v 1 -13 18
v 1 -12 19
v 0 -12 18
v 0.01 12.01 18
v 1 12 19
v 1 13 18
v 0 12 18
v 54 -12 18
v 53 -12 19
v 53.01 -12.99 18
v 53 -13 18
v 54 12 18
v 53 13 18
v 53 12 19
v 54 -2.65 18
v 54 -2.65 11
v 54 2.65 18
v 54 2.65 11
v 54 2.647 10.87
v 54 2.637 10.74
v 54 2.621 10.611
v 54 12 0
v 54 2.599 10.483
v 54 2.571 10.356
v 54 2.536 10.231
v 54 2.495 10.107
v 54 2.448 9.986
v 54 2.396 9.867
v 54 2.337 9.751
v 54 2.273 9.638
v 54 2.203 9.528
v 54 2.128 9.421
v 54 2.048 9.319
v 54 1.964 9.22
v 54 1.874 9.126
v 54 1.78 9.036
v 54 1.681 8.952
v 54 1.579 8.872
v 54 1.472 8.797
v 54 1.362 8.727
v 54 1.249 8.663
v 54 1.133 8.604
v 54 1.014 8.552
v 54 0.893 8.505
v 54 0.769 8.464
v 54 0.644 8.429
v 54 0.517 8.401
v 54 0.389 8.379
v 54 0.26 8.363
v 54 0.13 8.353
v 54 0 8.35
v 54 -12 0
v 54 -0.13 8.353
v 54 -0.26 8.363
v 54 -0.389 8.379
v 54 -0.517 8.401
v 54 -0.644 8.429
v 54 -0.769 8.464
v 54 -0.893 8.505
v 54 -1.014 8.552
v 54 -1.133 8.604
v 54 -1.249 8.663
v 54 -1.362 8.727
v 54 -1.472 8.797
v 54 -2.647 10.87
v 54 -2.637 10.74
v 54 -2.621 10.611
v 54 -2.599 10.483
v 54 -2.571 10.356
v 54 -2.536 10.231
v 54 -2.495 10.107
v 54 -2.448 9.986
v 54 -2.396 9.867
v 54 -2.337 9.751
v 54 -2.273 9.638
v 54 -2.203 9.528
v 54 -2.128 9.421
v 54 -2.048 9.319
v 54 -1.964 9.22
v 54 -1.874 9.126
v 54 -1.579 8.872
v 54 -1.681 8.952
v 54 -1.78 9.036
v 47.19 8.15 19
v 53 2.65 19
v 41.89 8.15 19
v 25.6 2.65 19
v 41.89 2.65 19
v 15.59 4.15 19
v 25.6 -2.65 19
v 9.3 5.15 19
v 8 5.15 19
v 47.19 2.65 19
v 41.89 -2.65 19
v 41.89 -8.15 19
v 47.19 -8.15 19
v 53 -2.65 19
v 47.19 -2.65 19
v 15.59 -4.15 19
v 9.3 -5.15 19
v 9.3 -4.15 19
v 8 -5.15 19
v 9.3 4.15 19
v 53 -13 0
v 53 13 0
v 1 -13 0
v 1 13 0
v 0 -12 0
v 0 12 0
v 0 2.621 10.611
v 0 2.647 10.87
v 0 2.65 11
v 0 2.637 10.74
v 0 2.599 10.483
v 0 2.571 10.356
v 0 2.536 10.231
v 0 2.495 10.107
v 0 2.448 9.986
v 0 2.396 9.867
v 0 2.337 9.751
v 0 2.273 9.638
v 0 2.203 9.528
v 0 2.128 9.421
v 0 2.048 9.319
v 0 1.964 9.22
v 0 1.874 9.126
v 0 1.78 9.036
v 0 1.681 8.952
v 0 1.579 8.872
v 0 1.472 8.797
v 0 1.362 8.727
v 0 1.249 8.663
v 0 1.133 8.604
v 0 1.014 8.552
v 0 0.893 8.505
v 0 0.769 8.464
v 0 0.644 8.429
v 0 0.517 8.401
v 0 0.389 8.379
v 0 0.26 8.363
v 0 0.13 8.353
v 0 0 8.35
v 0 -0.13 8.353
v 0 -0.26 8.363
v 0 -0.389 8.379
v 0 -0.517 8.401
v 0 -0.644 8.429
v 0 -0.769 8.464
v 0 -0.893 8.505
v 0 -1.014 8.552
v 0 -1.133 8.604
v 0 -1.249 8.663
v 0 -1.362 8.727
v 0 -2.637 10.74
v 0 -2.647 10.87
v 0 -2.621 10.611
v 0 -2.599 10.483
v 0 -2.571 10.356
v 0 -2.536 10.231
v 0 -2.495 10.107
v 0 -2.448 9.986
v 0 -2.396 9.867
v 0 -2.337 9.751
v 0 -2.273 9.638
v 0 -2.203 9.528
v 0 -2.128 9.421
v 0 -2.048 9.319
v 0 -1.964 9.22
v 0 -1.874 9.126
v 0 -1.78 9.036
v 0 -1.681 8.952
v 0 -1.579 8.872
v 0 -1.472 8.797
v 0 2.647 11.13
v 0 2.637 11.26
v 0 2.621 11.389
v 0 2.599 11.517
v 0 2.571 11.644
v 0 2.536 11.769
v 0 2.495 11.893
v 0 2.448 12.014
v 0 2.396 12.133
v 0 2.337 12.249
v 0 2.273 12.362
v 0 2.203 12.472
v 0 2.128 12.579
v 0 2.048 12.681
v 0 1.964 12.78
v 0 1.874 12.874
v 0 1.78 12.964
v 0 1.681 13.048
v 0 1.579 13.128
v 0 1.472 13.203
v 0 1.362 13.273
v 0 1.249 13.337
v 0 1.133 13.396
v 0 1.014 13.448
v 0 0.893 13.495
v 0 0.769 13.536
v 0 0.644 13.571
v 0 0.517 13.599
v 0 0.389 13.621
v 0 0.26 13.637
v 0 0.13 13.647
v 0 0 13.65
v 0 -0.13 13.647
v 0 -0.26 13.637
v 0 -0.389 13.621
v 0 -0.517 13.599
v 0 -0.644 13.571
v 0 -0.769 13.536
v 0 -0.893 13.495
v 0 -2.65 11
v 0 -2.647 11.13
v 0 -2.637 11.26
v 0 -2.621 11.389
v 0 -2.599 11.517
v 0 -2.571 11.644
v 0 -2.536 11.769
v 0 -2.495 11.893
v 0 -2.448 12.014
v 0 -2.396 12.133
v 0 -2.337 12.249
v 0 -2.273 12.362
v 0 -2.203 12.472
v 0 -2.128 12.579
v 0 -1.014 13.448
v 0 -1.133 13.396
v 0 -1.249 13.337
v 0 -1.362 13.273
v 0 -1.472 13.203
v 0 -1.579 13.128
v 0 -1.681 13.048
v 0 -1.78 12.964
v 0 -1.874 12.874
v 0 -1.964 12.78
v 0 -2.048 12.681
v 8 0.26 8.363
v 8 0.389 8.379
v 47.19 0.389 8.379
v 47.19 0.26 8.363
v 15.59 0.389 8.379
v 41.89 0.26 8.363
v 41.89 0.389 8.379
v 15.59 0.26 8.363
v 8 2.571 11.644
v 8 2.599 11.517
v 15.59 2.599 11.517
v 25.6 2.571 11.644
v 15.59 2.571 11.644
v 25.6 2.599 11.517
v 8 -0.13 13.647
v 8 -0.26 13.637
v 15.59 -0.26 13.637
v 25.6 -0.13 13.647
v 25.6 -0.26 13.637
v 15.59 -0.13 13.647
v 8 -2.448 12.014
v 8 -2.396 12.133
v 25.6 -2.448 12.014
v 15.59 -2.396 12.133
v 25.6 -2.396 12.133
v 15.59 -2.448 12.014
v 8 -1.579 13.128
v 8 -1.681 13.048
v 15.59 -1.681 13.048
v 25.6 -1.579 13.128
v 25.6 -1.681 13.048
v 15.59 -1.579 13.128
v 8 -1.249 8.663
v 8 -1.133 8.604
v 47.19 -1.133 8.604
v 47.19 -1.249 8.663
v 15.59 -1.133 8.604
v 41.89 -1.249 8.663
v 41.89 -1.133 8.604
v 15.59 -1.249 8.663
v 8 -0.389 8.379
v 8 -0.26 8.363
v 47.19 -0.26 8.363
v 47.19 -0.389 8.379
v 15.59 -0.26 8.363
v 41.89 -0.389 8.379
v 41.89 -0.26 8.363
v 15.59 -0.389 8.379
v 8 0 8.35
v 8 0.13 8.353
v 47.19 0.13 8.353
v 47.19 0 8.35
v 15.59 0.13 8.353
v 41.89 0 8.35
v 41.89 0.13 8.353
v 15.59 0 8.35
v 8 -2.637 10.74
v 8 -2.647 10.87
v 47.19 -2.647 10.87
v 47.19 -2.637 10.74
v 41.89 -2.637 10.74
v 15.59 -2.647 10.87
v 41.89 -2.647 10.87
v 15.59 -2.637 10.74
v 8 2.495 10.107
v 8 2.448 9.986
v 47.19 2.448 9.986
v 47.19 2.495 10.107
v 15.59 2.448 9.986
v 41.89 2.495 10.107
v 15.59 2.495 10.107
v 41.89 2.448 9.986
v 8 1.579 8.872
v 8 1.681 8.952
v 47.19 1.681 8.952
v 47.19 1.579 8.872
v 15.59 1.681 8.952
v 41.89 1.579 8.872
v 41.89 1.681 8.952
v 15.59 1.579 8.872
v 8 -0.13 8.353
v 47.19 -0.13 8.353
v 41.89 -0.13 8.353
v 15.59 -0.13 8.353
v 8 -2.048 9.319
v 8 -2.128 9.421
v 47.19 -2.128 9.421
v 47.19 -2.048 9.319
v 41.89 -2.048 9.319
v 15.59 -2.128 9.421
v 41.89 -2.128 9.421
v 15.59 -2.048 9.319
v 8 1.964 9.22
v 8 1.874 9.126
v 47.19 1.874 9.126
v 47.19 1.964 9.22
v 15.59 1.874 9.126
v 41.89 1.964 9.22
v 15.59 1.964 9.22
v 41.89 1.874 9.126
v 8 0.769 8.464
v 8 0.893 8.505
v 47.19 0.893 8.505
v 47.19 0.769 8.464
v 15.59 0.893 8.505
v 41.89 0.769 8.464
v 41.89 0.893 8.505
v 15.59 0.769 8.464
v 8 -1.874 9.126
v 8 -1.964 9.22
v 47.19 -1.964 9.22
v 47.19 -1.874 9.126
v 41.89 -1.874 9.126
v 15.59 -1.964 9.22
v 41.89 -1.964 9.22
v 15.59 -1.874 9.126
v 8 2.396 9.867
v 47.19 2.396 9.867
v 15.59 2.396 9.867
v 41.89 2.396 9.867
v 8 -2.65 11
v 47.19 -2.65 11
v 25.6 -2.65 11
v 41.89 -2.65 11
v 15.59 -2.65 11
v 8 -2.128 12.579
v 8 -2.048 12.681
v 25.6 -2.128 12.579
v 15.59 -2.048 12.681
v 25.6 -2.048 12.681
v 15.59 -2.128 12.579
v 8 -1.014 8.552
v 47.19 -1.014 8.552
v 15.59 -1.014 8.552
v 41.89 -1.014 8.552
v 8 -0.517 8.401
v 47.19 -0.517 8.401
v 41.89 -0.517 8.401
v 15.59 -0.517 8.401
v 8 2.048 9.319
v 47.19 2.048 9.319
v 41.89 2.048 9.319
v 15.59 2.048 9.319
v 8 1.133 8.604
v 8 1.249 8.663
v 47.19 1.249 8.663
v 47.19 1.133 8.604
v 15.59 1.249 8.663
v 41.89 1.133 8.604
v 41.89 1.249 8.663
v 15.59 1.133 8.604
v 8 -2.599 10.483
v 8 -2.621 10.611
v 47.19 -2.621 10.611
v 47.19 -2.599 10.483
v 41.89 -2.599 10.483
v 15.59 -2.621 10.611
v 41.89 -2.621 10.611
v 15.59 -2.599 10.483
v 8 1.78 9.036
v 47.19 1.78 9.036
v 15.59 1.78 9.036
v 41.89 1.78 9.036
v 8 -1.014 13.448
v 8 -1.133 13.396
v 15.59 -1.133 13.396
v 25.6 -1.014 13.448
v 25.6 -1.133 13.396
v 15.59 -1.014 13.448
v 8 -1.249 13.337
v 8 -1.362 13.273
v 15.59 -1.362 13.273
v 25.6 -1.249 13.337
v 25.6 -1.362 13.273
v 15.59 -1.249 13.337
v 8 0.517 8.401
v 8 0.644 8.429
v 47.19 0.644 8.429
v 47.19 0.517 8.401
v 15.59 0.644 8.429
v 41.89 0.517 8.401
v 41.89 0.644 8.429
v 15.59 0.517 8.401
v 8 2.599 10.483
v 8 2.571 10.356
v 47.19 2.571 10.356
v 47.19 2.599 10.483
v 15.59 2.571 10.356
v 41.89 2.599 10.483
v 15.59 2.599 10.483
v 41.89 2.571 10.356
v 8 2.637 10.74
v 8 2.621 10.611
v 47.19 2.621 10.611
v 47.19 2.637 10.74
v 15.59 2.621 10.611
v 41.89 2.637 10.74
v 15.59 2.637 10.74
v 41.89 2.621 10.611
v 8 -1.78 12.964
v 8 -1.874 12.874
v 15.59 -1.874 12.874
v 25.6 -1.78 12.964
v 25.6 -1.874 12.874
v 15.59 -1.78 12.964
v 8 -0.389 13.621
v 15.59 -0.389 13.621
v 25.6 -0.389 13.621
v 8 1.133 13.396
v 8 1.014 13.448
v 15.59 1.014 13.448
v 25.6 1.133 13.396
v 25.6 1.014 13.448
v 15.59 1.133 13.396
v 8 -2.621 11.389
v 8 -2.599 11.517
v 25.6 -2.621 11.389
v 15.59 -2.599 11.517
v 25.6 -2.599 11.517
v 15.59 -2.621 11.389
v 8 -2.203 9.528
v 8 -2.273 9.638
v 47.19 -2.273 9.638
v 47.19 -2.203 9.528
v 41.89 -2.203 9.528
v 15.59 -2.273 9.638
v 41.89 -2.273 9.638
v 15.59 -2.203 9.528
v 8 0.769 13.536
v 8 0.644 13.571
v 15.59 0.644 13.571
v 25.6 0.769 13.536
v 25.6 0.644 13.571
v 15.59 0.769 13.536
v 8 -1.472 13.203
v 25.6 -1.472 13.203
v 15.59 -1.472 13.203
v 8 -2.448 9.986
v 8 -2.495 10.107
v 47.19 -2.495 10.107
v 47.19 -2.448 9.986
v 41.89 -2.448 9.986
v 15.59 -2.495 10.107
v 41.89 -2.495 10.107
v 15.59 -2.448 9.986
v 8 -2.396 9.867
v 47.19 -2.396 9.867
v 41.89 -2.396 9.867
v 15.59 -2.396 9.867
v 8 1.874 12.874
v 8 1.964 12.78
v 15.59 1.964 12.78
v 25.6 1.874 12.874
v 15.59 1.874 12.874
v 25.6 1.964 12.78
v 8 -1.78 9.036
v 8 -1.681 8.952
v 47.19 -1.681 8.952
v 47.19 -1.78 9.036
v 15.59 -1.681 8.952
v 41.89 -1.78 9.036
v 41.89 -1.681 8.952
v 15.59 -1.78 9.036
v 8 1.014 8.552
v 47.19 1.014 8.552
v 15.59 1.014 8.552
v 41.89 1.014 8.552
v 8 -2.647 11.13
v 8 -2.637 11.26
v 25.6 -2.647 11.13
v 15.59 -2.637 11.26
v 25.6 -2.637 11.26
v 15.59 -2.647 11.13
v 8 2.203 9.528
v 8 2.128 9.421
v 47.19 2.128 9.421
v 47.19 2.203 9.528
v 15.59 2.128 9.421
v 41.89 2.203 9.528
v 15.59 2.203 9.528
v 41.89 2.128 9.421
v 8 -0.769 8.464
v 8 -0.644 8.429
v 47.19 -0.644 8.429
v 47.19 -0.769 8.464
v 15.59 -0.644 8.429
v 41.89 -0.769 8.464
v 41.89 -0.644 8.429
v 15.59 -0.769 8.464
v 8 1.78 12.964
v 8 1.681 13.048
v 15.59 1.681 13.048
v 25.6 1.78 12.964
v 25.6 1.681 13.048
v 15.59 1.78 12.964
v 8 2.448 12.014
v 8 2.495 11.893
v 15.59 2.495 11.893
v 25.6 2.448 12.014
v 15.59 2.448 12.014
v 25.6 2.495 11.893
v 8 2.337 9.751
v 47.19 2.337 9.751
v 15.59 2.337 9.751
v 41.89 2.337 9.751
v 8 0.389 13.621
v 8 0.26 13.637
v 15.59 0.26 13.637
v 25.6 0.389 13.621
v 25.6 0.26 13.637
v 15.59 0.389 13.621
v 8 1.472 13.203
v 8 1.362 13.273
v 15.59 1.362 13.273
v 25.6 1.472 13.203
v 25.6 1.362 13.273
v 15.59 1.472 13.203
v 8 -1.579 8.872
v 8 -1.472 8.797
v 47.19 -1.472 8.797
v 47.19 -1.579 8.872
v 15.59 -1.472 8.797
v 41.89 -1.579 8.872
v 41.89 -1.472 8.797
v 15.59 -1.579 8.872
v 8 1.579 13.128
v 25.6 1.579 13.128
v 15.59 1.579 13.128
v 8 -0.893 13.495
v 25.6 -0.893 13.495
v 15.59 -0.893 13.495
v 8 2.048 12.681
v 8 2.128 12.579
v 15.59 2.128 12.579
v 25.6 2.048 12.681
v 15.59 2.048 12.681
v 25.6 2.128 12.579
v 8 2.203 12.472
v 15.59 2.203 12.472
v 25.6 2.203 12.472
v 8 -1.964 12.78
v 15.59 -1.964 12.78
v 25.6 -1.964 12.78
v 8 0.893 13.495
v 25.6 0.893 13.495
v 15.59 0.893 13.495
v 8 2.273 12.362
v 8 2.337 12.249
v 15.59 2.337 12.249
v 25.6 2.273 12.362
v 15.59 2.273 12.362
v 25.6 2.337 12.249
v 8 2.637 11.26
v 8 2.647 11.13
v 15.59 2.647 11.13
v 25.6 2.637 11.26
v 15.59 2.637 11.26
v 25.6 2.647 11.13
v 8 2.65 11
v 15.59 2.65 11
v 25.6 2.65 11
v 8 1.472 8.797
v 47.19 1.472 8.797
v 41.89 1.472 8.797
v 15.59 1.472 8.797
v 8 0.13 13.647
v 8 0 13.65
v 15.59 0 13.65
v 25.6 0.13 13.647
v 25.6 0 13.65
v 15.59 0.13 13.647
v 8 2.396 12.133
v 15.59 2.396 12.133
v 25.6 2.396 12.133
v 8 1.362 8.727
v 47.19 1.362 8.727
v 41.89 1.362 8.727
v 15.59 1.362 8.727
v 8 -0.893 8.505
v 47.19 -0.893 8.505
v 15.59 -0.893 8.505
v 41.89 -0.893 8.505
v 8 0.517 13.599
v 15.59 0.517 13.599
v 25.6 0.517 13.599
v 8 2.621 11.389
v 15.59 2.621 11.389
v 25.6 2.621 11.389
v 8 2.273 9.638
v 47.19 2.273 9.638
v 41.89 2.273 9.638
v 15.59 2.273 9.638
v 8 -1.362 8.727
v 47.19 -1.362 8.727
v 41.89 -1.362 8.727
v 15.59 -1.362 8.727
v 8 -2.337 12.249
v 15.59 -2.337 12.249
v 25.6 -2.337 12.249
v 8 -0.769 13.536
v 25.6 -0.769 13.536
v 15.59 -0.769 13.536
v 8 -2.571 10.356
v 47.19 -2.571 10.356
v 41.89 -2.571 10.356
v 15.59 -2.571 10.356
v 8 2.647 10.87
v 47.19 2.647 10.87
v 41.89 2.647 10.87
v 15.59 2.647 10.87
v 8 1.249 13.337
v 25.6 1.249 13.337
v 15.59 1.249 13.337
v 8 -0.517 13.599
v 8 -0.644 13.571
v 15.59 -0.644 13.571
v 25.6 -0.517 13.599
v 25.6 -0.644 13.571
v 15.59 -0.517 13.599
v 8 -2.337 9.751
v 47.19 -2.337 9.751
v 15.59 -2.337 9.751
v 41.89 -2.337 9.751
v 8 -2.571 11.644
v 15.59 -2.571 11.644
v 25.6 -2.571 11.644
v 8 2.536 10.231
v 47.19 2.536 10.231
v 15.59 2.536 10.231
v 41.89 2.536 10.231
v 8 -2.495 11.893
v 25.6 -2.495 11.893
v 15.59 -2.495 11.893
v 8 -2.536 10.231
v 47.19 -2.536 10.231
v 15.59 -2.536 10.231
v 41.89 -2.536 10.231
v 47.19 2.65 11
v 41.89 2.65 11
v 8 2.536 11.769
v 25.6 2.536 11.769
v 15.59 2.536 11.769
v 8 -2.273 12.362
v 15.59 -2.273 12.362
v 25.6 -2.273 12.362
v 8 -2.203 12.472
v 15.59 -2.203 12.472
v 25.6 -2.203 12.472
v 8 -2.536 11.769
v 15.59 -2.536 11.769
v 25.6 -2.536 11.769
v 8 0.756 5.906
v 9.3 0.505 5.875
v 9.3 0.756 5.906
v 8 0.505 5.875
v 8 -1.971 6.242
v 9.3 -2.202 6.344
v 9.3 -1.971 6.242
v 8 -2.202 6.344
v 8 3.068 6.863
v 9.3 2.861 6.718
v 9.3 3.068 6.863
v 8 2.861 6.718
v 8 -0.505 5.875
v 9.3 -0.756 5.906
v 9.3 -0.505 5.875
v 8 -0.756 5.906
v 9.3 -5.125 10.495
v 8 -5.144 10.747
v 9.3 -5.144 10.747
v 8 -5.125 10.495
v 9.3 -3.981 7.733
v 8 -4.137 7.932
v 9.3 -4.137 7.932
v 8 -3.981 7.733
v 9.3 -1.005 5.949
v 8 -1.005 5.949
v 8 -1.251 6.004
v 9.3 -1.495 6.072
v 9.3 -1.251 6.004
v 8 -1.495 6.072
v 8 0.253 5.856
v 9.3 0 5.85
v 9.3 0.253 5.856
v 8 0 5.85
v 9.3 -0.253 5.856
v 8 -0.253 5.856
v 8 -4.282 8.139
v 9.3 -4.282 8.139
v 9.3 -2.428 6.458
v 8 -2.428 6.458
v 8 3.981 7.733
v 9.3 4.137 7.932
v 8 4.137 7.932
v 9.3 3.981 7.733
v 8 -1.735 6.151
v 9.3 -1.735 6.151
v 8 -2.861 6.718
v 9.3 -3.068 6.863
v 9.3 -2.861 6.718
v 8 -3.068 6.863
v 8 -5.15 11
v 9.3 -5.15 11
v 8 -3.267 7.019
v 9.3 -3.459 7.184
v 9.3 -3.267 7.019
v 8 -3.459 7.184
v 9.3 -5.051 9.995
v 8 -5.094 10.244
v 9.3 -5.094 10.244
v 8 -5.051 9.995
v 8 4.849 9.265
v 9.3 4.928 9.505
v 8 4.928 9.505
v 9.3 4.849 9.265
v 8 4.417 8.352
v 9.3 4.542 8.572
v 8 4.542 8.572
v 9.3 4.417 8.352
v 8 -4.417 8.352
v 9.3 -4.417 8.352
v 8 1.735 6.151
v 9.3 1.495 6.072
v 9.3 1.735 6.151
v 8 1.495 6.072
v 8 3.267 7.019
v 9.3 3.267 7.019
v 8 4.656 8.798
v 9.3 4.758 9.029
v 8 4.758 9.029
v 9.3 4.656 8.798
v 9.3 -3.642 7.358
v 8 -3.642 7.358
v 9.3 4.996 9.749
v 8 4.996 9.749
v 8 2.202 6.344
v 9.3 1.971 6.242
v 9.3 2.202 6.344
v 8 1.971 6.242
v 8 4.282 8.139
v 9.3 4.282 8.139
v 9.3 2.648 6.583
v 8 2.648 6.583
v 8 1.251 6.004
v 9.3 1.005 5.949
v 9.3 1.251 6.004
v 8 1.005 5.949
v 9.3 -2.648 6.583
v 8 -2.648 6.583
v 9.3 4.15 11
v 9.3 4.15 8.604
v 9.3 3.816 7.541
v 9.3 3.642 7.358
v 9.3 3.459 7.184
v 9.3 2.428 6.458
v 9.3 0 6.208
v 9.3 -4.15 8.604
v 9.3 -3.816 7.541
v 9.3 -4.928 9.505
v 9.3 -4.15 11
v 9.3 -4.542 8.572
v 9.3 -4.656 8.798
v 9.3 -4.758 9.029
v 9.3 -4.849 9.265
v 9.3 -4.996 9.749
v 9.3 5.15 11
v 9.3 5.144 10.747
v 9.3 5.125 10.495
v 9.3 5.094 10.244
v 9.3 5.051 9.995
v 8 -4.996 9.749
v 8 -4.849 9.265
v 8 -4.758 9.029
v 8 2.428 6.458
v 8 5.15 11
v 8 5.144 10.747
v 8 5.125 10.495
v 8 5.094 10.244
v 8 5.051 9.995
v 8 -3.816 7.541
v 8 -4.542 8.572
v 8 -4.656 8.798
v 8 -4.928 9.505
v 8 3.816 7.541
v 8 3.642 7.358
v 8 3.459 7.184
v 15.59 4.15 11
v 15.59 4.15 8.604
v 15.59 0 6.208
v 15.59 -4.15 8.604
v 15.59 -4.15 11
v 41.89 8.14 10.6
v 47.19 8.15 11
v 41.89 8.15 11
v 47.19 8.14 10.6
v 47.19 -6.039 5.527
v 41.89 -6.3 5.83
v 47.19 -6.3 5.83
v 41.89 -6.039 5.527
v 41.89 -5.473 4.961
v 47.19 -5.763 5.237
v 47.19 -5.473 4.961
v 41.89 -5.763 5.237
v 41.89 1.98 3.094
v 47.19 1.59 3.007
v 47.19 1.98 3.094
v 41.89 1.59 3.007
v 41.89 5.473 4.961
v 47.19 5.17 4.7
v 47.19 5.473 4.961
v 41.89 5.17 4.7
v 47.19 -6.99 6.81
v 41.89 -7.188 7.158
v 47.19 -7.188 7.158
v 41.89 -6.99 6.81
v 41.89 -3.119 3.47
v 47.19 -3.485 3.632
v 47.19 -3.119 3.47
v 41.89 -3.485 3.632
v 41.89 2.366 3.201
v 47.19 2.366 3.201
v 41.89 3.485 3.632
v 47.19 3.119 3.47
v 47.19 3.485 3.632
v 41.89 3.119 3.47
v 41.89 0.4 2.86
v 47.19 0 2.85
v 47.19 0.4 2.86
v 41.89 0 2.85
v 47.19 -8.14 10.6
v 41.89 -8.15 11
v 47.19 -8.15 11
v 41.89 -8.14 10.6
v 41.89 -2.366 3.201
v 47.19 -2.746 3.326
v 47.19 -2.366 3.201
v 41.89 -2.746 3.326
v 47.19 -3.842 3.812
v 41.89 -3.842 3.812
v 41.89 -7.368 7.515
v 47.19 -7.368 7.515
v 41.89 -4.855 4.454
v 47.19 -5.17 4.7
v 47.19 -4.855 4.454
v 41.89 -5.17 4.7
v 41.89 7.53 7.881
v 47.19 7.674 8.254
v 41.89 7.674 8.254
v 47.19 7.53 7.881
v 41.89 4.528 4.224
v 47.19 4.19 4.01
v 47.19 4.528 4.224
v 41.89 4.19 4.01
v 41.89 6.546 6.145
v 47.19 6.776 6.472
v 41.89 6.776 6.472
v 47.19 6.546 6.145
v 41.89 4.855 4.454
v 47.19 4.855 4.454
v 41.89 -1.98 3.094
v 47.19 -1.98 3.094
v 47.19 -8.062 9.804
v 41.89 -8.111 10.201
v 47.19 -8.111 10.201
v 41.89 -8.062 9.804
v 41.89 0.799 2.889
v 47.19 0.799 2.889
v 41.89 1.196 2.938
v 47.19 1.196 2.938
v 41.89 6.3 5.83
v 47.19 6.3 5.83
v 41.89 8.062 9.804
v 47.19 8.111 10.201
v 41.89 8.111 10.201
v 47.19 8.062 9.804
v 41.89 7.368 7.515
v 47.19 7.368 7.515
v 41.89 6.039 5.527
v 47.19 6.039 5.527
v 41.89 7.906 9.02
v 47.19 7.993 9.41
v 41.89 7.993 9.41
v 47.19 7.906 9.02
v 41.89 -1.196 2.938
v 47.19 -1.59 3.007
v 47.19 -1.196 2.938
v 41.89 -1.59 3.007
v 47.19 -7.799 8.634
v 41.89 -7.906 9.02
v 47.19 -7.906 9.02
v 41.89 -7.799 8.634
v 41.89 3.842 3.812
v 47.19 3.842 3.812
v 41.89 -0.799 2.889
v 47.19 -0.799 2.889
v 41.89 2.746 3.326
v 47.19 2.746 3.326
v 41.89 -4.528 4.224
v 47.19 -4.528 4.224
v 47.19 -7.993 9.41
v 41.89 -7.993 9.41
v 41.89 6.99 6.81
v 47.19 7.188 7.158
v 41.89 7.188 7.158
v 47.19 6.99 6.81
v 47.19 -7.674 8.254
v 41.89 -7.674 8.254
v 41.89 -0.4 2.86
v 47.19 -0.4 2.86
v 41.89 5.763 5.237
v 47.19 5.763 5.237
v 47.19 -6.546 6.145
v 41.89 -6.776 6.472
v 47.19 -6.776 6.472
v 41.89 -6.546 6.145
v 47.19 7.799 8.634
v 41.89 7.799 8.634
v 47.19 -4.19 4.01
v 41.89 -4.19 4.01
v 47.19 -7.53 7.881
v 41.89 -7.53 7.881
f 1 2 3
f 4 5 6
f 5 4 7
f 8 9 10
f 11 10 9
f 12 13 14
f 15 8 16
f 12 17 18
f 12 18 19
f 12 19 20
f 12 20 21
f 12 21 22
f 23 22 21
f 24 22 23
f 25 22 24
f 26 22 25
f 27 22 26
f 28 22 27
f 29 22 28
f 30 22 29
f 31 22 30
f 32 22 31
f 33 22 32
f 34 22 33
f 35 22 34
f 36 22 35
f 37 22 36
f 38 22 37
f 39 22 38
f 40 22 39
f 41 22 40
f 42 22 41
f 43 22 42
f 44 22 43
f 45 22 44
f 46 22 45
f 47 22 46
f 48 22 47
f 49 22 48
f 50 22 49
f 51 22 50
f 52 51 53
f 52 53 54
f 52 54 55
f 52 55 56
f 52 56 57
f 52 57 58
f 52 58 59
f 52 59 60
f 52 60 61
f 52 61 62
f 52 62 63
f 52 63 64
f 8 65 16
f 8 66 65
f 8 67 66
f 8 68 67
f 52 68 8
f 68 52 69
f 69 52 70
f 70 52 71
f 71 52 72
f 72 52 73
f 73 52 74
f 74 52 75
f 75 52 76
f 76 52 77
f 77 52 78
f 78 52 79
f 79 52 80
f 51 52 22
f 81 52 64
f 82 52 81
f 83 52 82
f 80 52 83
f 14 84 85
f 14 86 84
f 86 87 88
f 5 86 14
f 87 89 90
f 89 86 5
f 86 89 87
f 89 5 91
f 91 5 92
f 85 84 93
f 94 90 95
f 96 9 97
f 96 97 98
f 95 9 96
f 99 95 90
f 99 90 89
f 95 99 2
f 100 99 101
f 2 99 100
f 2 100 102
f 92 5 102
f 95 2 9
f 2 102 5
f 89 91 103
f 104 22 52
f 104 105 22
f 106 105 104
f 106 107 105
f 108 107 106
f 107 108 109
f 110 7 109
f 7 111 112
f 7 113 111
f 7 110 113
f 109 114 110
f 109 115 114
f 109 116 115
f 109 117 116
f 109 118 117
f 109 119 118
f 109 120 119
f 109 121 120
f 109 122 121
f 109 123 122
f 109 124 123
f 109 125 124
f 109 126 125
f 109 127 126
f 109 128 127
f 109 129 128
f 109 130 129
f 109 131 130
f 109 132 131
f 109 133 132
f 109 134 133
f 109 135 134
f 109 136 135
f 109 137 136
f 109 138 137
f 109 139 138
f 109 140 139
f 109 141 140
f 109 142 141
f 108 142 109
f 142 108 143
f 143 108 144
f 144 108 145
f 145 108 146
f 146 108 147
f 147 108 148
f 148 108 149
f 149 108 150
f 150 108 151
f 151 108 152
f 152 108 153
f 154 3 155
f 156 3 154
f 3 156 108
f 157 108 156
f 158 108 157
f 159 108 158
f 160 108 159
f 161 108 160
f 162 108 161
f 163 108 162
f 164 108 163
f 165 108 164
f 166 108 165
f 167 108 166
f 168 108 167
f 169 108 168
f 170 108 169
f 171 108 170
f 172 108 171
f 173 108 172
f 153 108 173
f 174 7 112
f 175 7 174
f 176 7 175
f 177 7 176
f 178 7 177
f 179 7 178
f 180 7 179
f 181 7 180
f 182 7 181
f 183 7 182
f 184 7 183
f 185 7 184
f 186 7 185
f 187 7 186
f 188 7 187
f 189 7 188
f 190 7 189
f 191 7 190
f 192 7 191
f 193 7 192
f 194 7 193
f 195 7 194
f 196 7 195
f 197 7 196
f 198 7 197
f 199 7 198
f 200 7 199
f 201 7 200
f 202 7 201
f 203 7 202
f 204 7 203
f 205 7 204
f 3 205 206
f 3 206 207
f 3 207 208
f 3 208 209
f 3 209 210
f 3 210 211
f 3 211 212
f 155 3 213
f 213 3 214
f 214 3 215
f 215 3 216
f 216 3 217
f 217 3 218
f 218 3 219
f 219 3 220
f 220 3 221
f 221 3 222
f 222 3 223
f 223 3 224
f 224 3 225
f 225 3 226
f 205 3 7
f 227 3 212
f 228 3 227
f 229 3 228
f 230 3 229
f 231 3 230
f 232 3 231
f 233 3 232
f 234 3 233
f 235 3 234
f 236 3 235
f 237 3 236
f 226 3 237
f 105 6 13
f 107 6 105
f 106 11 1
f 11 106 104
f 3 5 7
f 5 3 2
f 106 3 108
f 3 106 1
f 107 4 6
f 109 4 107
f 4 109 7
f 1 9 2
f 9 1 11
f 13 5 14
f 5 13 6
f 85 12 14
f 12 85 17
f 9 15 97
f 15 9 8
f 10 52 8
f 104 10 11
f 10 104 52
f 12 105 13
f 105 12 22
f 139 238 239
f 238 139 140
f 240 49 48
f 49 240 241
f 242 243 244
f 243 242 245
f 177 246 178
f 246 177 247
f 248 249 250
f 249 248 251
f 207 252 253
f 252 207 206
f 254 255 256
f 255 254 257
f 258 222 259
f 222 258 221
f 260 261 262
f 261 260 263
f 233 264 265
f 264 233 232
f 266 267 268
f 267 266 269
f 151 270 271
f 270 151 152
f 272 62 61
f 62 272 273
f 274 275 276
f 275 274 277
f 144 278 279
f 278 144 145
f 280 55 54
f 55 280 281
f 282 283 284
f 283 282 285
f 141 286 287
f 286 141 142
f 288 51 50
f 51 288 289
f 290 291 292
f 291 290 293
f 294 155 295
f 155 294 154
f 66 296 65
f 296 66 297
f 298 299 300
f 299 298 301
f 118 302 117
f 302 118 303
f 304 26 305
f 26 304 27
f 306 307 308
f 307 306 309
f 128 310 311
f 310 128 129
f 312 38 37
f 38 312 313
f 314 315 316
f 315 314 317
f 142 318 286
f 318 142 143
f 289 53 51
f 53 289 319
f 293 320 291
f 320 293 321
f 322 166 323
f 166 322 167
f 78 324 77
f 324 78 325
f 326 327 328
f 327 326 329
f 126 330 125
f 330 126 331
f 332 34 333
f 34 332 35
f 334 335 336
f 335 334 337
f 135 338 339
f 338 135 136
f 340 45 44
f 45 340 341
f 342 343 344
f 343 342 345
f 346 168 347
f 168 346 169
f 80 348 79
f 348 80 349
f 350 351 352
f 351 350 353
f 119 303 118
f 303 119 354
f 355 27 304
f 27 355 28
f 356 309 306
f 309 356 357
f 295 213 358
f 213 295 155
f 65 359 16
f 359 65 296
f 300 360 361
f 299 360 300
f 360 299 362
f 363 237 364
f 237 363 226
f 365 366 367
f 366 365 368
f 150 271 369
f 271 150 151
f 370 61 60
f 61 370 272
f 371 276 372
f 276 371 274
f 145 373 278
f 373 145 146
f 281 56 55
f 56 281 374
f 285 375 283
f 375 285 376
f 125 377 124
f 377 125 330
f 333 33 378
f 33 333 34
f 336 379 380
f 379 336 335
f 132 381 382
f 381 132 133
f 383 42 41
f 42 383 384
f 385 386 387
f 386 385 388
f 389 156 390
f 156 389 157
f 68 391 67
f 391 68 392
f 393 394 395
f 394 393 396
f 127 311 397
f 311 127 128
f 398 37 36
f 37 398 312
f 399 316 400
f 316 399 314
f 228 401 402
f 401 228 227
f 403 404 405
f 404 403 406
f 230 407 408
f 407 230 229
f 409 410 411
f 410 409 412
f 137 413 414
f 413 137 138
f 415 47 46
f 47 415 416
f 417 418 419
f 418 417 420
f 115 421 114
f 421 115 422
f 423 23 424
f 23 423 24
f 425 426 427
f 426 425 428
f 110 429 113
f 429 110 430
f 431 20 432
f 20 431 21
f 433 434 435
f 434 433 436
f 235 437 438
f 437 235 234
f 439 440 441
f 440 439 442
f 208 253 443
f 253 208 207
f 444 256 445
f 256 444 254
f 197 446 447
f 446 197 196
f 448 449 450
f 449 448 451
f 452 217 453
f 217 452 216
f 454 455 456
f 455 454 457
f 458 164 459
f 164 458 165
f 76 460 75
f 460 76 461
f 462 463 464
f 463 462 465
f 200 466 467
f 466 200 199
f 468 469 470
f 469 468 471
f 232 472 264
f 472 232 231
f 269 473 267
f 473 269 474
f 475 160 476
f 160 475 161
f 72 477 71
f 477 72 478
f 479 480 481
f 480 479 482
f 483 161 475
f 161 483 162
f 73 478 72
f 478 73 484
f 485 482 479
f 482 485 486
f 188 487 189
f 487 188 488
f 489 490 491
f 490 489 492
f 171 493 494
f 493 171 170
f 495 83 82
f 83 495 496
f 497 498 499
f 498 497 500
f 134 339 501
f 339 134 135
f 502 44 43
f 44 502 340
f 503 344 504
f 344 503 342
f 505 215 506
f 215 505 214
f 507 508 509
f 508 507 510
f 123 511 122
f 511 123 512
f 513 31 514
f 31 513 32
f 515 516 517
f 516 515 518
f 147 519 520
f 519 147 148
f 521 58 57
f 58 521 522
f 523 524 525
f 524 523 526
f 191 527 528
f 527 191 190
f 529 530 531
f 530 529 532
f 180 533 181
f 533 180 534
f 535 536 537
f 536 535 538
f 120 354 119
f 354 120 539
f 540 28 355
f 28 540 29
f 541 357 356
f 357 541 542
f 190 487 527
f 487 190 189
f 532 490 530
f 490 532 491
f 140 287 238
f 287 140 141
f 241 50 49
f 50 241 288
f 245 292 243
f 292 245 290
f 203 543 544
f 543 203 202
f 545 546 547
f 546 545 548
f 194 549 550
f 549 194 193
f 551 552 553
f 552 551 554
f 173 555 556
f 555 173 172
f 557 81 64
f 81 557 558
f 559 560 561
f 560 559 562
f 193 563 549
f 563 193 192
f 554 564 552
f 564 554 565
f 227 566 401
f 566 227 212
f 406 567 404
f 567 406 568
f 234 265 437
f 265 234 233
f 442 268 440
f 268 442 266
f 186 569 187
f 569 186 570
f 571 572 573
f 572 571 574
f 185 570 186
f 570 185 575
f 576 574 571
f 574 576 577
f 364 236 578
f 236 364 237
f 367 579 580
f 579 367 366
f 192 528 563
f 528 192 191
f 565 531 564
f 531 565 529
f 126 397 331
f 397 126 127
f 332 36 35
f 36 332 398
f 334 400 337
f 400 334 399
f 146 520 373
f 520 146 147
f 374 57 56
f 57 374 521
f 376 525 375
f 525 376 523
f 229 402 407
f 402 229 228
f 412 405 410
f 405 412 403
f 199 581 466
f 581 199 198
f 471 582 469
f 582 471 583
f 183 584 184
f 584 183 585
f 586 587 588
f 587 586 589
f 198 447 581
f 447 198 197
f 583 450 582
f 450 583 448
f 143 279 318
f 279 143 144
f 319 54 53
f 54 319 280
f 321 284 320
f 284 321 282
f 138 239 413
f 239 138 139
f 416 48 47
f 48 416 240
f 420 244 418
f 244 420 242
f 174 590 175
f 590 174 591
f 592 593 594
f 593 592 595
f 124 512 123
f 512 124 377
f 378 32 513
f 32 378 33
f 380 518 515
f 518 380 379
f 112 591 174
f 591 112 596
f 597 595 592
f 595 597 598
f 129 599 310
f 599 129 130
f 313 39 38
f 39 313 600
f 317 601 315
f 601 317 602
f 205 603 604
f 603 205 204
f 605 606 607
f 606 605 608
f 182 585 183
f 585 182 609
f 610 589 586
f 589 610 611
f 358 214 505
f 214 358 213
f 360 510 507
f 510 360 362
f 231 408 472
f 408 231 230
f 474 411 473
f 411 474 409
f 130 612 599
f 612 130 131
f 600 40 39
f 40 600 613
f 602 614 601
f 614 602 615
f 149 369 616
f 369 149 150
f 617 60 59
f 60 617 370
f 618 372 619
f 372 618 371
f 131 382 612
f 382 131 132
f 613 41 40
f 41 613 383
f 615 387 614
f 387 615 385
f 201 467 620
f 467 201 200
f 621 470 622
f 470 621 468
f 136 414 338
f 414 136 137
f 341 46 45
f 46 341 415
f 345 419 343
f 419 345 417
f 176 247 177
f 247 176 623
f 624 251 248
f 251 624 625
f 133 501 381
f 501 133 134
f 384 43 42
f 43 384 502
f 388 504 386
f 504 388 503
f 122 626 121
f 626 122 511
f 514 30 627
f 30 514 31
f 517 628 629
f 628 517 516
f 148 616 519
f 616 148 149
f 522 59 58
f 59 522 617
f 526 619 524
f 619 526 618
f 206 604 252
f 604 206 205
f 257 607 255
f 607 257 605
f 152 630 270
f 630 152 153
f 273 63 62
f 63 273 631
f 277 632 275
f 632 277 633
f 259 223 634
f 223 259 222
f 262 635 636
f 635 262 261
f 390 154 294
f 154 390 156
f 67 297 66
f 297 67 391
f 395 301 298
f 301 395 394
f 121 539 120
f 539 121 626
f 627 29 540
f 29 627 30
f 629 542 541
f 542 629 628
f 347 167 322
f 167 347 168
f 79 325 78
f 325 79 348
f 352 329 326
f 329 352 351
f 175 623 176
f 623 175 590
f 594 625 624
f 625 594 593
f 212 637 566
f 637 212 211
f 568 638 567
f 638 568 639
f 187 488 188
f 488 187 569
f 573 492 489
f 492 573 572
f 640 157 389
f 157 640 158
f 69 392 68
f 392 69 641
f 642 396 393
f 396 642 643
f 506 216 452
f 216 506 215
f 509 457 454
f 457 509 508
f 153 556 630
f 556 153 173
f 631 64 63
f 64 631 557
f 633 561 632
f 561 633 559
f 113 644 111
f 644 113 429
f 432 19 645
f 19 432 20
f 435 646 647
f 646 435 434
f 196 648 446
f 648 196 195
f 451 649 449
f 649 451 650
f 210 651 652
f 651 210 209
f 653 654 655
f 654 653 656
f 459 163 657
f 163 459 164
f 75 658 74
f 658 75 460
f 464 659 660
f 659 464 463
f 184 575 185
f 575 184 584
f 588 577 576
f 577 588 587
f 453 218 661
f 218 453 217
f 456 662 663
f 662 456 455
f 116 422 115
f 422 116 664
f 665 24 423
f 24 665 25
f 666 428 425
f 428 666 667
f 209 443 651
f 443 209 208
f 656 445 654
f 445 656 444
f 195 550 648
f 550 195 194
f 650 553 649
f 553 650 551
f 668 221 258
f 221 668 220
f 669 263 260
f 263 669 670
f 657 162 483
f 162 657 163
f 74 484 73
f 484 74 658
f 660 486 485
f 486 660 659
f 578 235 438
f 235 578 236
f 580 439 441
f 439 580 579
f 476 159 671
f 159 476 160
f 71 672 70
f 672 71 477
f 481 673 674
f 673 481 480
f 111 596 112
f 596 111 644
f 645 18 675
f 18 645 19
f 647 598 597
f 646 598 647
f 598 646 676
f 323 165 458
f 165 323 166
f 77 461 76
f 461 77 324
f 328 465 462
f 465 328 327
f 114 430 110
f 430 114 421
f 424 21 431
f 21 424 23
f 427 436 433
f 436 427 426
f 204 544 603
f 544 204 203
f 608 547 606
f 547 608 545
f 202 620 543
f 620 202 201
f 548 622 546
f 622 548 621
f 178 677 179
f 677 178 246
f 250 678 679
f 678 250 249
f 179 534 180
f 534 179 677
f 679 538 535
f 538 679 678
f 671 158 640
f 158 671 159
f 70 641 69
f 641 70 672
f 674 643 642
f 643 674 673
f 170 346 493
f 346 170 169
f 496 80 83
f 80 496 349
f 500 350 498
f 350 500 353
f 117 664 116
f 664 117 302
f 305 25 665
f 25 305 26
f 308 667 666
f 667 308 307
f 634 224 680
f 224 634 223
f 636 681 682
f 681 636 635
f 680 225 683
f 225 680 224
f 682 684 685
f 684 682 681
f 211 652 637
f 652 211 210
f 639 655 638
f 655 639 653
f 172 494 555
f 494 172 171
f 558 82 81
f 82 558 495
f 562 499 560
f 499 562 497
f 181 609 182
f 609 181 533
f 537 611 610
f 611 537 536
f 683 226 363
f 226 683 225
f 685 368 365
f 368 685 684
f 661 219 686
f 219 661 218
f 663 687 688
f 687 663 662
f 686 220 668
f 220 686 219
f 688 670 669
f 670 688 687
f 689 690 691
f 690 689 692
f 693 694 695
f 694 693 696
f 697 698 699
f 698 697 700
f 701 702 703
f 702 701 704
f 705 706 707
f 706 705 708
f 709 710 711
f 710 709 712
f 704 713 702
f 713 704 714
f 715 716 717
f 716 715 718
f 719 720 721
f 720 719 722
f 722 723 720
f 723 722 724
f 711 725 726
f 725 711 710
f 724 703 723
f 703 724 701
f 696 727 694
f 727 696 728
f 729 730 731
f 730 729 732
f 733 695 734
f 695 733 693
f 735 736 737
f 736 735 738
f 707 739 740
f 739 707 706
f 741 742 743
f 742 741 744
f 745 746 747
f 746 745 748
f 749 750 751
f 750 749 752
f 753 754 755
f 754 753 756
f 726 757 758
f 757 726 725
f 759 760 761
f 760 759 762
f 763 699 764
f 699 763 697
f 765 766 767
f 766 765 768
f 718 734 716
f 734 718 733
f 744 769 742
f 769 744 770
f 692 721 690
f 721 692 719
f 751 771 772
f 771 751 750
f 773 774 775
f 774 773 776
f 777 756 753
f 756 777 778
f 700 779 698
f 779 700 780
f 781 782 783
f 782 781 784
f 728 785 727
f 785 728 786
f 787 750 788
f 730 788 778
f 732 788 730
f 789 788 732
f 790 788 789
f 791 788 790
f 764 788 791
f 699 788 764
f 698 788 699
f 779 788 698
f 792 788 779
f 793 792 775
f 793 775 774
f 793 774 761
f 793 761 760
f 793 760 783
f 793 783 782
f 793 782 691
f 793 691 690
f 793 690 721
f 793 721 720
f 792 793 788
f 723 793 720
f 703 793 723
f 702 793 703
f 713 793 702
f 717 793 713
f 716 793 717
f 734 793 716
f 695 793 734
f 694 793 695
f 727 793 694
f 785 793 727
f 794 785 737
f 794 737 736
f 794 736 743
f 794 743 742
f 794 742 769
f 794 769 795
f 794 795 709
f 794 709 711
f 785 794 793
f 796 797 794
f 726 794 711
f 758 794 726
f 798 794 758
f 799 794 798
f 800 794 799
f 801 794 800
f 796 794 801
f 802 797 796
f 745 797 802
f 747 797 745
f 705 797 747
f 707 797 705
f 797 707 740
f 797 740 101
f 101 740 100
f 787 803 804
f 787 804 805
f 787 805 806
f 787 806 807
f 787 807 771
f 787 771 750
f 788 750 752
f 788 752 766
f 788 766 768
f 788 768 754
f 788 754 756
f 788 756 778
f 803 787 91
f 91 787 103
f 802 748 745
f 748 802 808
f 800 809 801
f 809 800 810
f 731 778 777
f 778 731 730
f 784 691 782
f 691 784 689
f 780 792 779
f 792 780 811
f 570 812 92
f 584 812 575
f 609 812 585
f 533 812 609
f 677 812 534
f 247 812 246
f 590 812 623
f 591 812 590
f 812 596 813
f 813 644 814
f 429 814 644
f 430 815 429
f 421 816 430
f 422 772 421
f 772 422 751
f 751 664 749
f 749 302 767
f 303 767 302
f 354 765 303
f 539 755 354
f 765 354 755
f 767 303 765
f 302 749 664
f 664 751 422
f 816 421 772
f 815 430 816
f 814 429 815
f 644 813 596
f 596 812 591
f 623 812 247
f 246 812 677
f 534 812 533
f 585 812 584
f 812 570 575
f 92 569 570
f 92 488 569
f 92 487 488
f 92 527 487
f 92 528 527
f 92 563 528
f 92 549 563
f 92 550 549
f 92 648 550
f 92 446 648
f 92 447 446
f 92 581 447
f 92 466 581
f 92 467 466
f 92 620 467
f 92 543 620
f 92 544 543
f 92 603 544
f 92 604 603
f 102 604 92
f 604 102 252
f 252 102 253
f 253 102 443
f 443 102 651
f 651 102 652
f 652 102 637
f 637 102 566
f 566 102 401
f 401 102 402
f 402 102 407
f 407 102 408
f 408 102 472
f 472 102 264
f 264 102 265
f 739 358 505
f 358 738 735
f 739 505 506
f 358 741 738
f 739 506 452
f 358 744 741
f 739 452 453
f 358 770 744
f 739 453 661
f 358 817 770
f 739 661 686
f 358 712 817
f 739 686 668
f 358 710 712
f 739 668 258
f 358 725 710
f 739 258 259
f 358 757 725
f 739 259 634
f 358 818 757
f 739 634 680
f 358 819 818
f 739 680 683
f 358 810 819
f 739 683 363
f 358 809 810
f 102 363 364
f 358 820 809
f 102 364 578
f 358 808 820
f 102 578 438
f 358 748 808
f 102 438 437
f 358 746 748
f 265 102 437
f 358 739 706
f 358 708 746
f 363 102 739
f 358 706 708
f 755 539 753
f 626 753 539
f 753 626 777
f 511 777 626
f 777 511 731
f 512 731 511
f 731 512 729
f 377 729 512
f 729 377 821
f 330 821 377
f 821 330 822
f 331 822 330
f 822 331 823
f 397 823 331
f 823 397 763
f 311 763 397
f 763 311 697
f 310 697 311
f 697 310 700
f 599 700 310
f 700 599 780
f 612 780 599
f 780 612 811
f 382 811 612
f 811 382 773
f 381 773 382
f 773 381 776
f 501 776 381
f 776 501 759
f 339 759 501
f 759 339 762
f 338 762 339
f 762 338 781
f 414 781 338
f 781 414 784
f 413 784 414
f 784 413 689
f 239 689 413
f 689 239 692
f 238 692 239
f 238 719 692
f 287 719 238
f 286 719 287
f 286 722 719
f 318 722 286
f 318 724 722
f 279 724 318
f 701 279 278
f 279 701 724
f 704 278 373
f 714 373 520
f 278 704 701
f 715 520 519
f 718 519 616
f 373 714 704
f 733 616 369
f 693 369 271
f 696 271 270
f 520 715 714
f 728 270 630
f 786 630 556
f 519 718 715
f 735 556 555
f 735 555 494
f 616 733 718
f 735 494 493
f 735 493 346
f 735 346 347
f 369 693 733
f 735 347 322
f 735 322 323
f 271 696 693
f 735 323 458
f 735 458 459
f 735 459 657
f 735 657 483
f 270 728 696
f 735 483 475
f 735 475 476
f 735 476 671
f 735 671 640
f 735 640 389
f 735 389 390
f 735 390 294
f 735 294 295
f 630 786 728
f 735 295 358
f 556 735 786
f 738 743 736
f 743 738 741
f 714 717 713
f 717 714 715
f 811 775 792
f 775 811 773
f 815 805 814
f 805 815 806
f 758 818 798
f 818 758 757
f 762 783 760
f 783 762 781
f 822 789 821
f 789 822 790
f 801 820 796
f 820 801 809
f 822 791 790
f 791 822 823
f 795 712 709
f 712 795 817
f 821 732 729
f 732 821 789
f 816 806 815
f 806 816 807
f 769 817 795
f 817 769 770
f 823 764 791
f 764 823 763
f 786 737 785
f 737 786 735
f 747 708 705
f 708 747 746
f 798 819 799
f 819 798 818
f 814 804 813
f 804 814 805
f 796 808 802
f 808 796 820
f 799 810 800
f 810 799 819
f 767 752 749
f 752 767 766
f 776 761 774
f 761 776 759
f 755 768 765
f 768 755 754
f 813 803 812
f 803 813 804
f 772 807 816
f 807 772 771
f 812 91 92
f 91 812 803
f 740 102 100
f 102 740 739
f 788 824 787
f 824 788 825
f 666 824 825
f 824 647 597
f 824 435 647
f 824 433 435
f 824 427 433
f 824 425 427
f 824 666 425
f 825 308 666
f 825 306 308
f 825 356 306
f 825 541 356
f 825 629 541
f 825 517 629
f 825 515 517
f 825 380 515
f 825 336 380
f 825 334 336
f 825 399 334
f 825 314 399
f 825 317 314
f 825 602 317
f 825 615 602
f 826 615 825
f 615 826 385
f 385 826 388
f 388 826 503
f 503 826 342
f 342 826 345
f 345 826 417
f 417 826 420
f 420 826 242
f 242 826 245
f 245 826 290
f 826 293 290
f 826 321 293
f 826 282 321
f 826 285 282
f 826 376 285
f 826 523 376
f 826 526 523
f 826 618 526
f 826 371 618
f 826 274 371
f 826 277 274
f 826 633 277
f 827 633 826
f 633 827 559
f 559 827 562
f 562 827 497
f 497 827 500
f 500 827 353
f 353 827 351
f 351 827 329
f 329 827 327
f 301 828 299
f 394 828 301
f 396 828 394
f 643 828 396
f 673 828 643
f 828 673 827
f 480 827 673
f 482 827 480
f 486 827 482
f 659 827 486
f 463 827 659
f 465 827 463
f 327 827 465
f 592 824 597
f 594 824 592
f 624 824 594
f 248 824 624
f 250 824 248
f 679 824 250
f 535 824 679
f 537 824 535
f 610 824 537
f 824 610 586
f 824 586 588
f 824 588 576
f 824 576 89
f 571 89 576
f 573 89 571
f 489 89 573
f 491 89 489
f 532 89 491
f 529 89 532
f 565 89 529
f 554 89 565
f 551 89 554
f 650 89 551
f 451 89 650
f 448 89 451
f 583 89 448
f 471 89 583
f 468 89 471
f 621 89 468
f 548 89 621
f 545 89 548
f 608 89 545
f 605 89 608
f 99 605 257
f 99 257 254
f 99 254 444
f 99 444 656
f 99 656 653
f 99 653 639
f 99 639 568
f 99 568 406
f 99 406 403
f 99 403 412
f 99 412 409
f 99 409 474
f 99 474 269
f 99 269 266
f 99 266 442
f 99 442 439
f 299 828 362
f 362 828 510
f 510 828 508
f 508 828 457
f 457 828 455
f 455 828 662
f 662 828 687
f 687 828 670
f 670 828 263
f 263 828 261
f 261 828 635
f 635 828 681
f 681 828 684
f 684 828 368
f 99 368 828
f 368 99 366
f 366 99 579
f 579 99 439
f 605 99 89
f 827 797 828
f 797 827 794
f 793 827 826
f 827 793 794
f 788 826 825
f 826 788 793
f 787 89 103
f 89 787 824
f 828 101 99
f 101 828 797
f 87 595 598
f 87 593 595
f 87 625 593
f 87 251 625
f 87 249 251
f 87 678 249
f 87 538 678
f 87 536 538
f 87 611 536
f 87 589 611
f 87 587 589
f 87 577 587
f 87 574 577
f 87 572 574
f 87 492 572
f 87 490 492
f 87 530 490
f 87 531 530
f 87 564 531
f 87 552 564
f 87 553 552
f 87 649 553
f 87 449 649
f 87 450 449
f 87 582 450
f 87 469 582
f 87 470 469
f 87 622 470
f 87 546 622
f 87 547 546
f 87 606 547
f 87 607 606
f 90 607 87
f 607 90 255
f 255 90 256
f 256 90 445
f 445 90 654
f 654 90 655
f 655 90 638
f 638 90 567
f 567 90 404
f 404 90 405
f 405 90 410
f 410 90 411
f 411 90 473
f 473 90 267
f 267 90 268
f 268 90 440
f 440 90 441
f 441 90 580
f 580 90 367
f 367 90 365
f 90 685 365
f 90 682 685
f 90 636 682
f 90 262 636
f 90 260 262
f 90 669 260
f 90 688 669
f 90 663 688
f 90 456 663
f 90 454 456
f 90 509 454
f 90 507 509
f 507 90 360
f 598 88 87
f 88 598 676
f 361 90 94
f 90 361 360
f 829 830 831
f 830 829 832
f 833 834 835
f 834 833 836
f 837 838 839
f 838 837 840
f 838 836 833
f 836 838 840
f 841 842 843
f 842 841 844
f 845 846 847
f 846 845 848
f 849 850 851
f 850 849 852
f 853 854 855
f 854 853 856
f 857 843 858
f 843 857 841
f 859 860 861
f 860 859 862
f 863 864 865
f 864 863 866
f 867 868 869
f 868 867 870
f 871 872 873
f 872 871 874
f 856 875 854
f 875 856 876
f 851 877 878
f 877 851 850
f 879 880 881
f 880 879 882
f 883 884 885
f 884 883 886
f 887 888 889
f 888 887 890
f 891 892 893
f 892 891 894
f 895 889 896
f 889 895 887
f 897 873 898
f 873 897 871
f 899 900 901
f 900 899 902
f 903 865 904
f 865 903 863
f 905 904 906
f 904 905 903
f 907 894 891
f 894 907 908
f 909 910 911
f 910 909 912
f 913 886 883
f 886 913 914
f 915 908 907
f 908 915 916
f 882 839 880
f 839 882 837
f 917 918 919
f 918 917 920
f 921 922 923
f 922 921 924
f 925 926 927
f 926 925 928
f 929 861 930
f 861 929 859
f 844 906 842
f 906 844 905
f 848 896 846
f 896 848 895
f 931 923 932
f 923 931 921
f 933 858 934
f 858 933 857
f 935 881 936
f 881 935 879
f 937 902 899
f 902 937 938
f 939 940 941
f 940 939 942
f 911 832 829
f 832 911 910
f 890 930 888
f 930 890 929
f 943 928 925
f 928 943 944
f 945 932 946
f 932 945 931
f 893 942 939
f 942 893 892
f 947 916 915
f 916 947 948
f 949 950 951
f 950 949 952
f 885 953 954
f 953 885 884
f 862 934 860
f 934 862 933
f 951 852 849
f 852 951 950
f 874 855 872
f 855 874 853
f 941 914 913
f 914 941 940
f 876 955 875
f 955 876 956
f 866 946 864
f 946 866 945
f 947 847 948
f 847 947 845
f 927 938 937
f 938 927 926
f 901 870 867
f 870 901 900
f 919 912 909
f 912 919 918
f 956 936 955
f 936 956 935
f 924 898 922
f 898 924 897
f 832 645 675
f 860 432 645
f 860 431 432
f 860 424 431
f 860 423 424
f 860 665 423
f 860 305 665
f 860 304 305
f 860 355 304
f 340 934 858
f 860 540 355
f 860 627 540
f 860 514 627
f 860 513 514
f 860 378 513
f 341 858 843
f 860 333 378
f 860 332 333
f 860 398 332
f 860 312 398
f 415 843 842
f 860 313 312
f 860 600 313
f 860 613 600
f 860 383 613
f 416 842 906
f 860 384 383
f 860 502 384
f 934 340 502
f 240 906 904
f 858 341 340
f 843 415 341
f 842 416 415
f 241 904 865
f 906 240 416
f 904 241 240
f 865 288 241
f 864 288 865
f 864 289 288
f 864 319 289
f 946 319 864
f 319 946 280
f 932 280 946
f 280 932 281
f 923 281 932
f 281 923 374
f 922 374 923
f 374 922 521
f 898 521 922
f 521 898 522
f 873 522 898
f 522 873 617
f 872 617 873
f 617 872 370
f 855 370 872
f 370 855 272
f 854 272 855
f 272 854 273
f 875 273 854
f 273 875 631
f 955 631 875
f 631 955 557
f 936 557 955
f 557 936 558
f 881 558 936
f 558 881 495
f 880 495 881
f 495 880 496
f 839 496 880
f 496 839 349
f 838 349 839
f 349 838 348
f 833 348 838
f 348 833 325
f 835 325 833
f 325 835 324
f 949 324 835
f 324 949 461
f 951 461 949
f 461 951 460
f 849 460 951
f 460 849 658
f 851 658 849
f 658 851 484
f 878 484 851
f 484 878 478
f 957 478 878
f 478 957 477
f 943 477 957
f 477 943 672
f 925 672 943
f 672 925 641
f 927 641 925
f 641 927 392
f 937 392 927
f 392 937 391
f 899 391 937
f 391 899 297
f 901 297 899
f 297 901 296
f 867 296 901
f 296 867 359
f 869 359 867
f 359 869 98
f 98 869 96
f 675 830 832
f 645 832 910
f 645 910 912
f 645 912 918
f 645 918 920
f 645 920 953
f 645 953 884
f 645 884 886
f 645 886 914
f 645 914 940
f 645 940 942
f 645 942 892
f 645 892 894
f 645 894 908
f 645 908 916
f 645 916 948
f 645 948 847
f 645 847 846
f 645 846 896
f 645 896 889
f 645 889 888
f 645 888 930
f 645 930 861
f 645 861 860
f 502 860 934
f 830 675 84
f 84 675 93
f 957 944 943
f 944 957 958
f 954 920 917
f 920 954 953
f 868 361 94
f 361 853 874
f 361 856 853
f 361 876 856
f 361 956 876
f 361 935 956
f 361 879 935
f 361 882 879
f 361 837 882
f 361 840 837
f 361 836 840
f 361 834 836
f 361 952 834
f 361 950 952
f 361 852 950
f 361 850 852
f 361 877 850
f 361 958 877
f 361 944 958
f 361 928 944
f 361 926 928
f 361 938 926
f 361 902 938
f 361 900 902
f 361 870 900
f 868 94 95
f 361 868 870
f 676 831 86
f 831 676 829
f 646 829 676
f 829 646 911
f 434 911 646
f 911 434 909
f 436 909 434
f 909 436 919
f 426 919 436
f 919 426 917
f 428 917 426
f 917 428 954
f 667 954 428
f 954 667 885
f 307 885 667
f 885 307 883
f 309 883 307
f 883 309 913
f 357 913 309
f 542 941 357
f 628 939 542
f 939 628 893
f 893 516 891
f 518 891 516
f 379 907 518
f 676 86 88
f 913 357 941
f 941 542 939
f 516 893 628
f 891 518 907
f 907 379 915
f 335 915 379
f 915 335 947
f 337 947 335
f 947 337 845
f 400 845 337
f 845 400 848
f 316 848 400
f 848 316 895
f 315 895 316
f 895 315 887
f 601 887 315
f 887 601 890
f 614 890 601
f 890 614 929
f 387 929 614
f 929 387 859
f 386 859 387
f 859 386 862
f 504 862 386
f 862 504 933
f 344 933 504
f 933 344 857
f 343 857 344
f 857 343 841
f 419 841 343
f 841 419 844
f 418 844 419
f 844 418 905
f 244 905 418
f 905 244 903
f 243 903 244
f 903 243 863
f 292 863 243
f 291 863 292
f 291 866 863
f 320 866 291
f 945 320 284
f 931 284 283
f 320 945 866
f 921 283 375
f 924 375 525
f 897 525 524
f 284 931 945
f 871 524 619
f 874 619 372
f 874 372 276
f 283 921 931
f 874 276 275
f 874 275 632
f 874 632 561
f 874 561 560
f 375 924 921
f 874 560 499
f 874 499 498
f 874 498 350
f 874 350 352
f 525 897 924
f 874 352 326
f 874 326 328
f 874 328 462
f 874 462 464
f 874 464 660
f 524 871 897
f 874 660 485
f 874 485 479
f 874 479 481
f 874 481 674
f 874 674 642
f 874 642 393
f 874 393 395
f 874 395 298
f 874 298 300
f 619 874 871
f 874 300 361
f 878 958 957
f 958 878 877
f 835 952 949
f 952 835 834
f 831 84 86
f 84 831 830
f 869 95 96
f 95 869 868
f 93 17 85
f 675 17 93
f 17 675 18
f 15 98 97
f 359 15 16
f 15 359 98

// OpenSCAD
/*
 * Ball bearing pusher - parametric version
 * ========================================
 *
 * Creates a 3D printable objects that forces an axis or rod into a 
 * ball bearing. Much easier than doing this by hand...
 *
 * Ball bearing pusher OpenSCAD script
 * Copyright (C) 2019  Thomas Hessling <mail@dream-dimensions.de>
 *
 * This program is free software: you can redistribute it and/or modify
 * it under the terms of the GNU General Public License as published by
 * the Free Software Foundation, either version 3 of the License, or
 * (at your option) any later version.
 *
 * This program is distributed in the hope that it will be useful,
 * but WITHOUT ANY WARRANTY; without even the implied warranty of
 * MERCHANTABILITY or FITNESS FOR A PARTICULAR PURPOSE.  See the
 * GNU General Public License for more details.
 *
 * You should have received a copy of the GNU General Public License
 * along with this program.  If not, see <https://www.gnu.org/licenses/>.
 *
 * https://www.dream-dimensions.de
 * https://www.thingiverse.com/thing:3068893
 *
 * ChangeLog:
 *  - License changed (2019-09-21)
 *    changed to GPLv3
 *  - Initial release (2018-08-28)
 *    model creation works, need to test final part dimensions
 *
 */
 
 
/*
 * Define your ball bearing and screw size below. 
 * Screw diameter should be equal or smaller than the rod.
 */
/* [General settings] */
// Ball bearing outer diameter
bb_outer_diameter = 16;     
// Ball bearing inner diameter
bb_inner_diameter = 5;      
// Ball bearing width
bb_width = 5;               
// Length of the rod
rod_length = 16;            
// Screw size
screw_index = 2;            //[0:M3,1:M4,2:M5,3:M6,4:M8,5:M10]


/* [Advanced settings] */
// basic tolerance for nut, washer, ball bearing and rod to apply
tolerance = 0.15;
// bottom base thickness 
base_thickness = 3;
// thickness of side walls
side_thickness = 5;
// thickness of the wall the force acts on when pushing the rod 
force_counter_thickness = 8;
// covered part between the nut and rod
cover_width = 10;
// chamfer size
chamfer_size = 1;

/* [Hidden] */
// metric screw nut and washer information
// name, thread diameter, nut thickness, nut width, washer diameter, washer thickness
nut_dims = [["M3", 3, 2.4, 5.5, 7.0, 0.5],
            ["M4", 4, 3.2, 7.0, 9.0, 0.8],
            ["M5", 5, 4.0, 8.0, 10.0, 1.0],
            ["M6", 6, 5.0, 10.0, 12.0, 1.6],
            ["M8", 8, 6.5, 13.0, 16.0, 1.6],
            ["M10", 10, 8.0, 19.0, 20.0, 2.0]];
// the color
col = [0.2,0.7,0.2];
// safety offset for boolean operations, prevents spurious surfaces
s = 0.01;
// safety offset for creating chamfers
cs = 0.1;
// smoothness
$fn = 128;

/*
 * Below are the routines creating the object, only touch them if you know what you are doing.
 * Things break easily. ;-)
 */
create_object();


// TODO: properly document the chamfer stuff...
module chamfer_edge(dims, chamfer) { 
    linear_extrude(max(dims)+2*cs) polygon([[chamfer,0], [0,chamfer], [-cs,chamfer], [-cs,-cs], [chamfer,-cs]]); 
}

module base_corner_bracket(chamfer, cfactor=2) {
    translate([cfactor*chamfer/2,cfactor*chamfer/2,0]) rotate(a=atan(1/sqrt(2)), v=[1,-1,0]) translate([-cfactor*chamfer/2,-cfactor*chamfer/2,-2.5*chamfer]) 
    linear_extrude(5*chamfer) polygon([[0,cfactor*chamfer],[0,0],[cfactor*chamfer,0]]);
}

module corner_bracket(cid, dims, chamfer) {
    if (cid == 1) {
        translate([0,0,0]) rotate([0,0,0])
        base_corner_bracket(chamfer);
    }
    else if (cid == 5) {
        translate([dims[0],0,0]) rotate([0,0,90])
        base_corner_bracket(chamfer);
    }
    else if (cid == 6) {
        translate([dims[0],dims[1],0]) rotate([0,0,180])
        base_corner_bracket(chamfer);
    }
    else if (cid == 2) {
        translate([0,dims[1],0]) rotate([0,0,-90])
        base_corner_bracket(chamfer);    
    }
    else if (cid == 3) {
        translate([0,dims[1],dims[2]]) rotate([180,0,0])
        translate([0,0,0]) rotate([0,0,0])
        base_corner_bracket(chamfer);
    }
    else if (cid == 7) {
        translate([0,dims[1],dims[2]]) rotate([180,0,0])
        translate([dims[0],0,0]) rotate([0,0,90])     
        base_corner_bracket(chamfer);       
    }
    else if (cid == 4) {
        translate([0,dims[1],dims[2]]) rotate([180,0,0])
        translate([dims[0],dims[1],0]) rotate([0,0,180])
        base_corner_bracket(chamfer);
    }
    else if (cid == 0) {
        translate([0,dims[1],dims[2]]) rotate([180,0,0])
        translate([0,dims[1],0]) rotate([0,0,-90])
        base_corner_bracket(chamfer);
    }
}

module chamfered_cube(dims=[1,1,1], chamfer=1, edges=[1,1,0,1,1,0,0,1,1,1,0,1]) { 

    corner_edges = [[0, 1, 4], [1, 2, 5], [2, 3, 6], [3, 0, 7], [4, 8, 11], [5, 8, 9], [6, 9, 10], [7, 8, 11]];
   
   
    difference() {
        cube(dims);

        // front face
        if (edges[0] == 1) {      
            translate([0, -cs, dims[2]]) rotate([-90,0,0]) chamfer_edge(dims, chamfer);
        }
        if (edges[1] == 1) {      
            translate([0, 0, -cs])  rotate([0,0,0]) chamfer_edge(dims, chamfer);
        }
        if (edges[2] == 1) {      
            translate([0, dims[1]+cs, 0]) rotate([90,0,0]) chamfer_edge(dims, chamfer);
        }
        if (edges[3] == 1) {      
            translate([0, dims[1], -cs]) rotate([0,0,-90]) chamfer_edge(dims, chamfer);
        }

        // side faces
        if (edges[4] == 1) {      
            translate([dims[0]+cs, 0, dims[2]]) rotate([-90,0,90]) chamfer_edge(dims, chamfer);
        }
        if (edges[5] == 1) {      
            translate([dims[0]+cs, 0, 0])  rotate([0,-90,0]) chamfer_edge(dims, chamfer);
        }
        if (edges[6] == 1) {      
            translate([-cs, dims[1], 0]) rotate([0,-90,180]) chamfer_edge(dims, chamfer);
        }
        if (edges[7] == 1) {      
            translate([dims[0]+cs, dims[1], dims[2]]) rotate([0,90,180]) chamfer_edge(dims, chamfer);
        }


        // back face
        if (edges[8] == 1) {      
            translate([dims[0], -cs, dims[2]]) rotate([-90,90,0]) chamfer_edge(dims, chamfer);
        }
        if (edges[9] == 1) {      
            translate([dims[0], 0, -cs]) rotate([0,0,90]) chamfer_edge(dims, chamfer);
        }
        if (edges[10] == 1) {      
            translate([dims[0], dims[1]+cs, 0]) rotate([90,-90,0]) chamfer_edge(dims, chamfer);
        }
        if (edges[11] == 1) {      
            translate([dims[0], dims[1], -cs]) rotate([0,0,180]) chamfer_edge(dims, chamfer);
        }

        // chamfer the corners
        for (i = [0 : 1 : 7]) {
            if (edges[corner_edges[i][0]] && edges[corner_edges[i][1]] && edges[corner_edges[i][2]]) {
                corner_bracket(i, dims, chamfer);
            }
        }
    }
    
}


// create a combined cyliner and cube
module create_cylcube(radius, thickness, factor=3) {
    height = thickness+2*tolerance;
    diam = 2*(radius+tolerance);
    
    union() {
        translate([0,0,0]) rotate([0,90,0]) cylinder(h=height, d=diam);
        translate([0,-diam/2, 0]) cube([height,diam,max(bb_outer_diameter,nut_dims[screw_index][4])]);
    }
}

module regular_polygon(order, r){
    r = r/cos(30);
 	angles=[ for (i = [0:order-1]) i*(360/order) ];
 	coords=[ for (th=angles) [r*cos(th), r*sin(th)] ];
 	polygon(coords);
}

// create a combined hexagon and cube
module create_hexcube(diameter, thickness, factor=3) {
    height = thickness + 2*tolerance;
    radius = diameter / 2 + tolerance;

    union() {
        rotate([0,90,0]) linear_extrude(height) regular_polygon(6, radius);
        translate([0,-radius, 0]) cube([height,2*radius,max(bb_outer_diameter,nut_dims[screw_index][4])]);
    }
   
}


// create the actual ball bearing pusher object
module create_object() {
    screw_diam = nut_dims[screw_index][1];
    nut_height = nut_dims[screw_index][2];
    nut_width = nut_dims[screw_index][3];
    washer_diam = nut_dims[screw_index][4];
    washer_height = nut_dims[screw_index][5];
    
    b_width = max(bb_outer_diameter,washer_diam) + 2*side_thickness;
    b_height = max(bb_outer_diameter,washer_diam) + base_thickness;
    b_length = ceil(rod_length + bb_width + nut_height*1.5 + 2*force_counter_thickness + cover_width + 6*tolerance);

    axis_position = base_thickness+bb_outer_diameter/2;
    
    
    washer_position = force_counter_thickness;
    nut_position = washer_position + washer_height + 2*tolerance;
    rod_position = nut_position + nut_height*1.5 + cover_width + 2*tolerance;
    bb_position = rod_position + rod_length + 2*tolerance;
    rod_exit_position = bb_position + bb_width + 2*tolerance;
   
    color(col)
    difference() {
        // base object
        difference() {
            translate([0,-b_width/2,0]) chamfered_cube([b_length, b_width, b_height], chamfer_size);
            translate([-2,0,axis_position]) rotate([0,90,0]) cylinder(h=b_length+4, d=screw_diam+2*tolerance);
        }
        
        translate([washer_position, 0, axis_position]) 
            create_cylcube(washer_diam/2, washer_height);

        translate([nut_position-s,0,axis_position]) 
            create_hexcube(nut_width, nut_height*1.5);

        translate([rod_position,0,axis_position]) 
            create_cylcube(bb_inner_diameter/2, rod_length);

        translate([bb_position-s,0,axis_position]) 
            create_cylcube(bb_outer_diameter/2, bb_width);
        
        translate([rod_exit_position-2*s,0,axis_position]) 
            create_cylcube(bb_inner_diameter/2, rod_length);
        
    }
    
    
    
}
